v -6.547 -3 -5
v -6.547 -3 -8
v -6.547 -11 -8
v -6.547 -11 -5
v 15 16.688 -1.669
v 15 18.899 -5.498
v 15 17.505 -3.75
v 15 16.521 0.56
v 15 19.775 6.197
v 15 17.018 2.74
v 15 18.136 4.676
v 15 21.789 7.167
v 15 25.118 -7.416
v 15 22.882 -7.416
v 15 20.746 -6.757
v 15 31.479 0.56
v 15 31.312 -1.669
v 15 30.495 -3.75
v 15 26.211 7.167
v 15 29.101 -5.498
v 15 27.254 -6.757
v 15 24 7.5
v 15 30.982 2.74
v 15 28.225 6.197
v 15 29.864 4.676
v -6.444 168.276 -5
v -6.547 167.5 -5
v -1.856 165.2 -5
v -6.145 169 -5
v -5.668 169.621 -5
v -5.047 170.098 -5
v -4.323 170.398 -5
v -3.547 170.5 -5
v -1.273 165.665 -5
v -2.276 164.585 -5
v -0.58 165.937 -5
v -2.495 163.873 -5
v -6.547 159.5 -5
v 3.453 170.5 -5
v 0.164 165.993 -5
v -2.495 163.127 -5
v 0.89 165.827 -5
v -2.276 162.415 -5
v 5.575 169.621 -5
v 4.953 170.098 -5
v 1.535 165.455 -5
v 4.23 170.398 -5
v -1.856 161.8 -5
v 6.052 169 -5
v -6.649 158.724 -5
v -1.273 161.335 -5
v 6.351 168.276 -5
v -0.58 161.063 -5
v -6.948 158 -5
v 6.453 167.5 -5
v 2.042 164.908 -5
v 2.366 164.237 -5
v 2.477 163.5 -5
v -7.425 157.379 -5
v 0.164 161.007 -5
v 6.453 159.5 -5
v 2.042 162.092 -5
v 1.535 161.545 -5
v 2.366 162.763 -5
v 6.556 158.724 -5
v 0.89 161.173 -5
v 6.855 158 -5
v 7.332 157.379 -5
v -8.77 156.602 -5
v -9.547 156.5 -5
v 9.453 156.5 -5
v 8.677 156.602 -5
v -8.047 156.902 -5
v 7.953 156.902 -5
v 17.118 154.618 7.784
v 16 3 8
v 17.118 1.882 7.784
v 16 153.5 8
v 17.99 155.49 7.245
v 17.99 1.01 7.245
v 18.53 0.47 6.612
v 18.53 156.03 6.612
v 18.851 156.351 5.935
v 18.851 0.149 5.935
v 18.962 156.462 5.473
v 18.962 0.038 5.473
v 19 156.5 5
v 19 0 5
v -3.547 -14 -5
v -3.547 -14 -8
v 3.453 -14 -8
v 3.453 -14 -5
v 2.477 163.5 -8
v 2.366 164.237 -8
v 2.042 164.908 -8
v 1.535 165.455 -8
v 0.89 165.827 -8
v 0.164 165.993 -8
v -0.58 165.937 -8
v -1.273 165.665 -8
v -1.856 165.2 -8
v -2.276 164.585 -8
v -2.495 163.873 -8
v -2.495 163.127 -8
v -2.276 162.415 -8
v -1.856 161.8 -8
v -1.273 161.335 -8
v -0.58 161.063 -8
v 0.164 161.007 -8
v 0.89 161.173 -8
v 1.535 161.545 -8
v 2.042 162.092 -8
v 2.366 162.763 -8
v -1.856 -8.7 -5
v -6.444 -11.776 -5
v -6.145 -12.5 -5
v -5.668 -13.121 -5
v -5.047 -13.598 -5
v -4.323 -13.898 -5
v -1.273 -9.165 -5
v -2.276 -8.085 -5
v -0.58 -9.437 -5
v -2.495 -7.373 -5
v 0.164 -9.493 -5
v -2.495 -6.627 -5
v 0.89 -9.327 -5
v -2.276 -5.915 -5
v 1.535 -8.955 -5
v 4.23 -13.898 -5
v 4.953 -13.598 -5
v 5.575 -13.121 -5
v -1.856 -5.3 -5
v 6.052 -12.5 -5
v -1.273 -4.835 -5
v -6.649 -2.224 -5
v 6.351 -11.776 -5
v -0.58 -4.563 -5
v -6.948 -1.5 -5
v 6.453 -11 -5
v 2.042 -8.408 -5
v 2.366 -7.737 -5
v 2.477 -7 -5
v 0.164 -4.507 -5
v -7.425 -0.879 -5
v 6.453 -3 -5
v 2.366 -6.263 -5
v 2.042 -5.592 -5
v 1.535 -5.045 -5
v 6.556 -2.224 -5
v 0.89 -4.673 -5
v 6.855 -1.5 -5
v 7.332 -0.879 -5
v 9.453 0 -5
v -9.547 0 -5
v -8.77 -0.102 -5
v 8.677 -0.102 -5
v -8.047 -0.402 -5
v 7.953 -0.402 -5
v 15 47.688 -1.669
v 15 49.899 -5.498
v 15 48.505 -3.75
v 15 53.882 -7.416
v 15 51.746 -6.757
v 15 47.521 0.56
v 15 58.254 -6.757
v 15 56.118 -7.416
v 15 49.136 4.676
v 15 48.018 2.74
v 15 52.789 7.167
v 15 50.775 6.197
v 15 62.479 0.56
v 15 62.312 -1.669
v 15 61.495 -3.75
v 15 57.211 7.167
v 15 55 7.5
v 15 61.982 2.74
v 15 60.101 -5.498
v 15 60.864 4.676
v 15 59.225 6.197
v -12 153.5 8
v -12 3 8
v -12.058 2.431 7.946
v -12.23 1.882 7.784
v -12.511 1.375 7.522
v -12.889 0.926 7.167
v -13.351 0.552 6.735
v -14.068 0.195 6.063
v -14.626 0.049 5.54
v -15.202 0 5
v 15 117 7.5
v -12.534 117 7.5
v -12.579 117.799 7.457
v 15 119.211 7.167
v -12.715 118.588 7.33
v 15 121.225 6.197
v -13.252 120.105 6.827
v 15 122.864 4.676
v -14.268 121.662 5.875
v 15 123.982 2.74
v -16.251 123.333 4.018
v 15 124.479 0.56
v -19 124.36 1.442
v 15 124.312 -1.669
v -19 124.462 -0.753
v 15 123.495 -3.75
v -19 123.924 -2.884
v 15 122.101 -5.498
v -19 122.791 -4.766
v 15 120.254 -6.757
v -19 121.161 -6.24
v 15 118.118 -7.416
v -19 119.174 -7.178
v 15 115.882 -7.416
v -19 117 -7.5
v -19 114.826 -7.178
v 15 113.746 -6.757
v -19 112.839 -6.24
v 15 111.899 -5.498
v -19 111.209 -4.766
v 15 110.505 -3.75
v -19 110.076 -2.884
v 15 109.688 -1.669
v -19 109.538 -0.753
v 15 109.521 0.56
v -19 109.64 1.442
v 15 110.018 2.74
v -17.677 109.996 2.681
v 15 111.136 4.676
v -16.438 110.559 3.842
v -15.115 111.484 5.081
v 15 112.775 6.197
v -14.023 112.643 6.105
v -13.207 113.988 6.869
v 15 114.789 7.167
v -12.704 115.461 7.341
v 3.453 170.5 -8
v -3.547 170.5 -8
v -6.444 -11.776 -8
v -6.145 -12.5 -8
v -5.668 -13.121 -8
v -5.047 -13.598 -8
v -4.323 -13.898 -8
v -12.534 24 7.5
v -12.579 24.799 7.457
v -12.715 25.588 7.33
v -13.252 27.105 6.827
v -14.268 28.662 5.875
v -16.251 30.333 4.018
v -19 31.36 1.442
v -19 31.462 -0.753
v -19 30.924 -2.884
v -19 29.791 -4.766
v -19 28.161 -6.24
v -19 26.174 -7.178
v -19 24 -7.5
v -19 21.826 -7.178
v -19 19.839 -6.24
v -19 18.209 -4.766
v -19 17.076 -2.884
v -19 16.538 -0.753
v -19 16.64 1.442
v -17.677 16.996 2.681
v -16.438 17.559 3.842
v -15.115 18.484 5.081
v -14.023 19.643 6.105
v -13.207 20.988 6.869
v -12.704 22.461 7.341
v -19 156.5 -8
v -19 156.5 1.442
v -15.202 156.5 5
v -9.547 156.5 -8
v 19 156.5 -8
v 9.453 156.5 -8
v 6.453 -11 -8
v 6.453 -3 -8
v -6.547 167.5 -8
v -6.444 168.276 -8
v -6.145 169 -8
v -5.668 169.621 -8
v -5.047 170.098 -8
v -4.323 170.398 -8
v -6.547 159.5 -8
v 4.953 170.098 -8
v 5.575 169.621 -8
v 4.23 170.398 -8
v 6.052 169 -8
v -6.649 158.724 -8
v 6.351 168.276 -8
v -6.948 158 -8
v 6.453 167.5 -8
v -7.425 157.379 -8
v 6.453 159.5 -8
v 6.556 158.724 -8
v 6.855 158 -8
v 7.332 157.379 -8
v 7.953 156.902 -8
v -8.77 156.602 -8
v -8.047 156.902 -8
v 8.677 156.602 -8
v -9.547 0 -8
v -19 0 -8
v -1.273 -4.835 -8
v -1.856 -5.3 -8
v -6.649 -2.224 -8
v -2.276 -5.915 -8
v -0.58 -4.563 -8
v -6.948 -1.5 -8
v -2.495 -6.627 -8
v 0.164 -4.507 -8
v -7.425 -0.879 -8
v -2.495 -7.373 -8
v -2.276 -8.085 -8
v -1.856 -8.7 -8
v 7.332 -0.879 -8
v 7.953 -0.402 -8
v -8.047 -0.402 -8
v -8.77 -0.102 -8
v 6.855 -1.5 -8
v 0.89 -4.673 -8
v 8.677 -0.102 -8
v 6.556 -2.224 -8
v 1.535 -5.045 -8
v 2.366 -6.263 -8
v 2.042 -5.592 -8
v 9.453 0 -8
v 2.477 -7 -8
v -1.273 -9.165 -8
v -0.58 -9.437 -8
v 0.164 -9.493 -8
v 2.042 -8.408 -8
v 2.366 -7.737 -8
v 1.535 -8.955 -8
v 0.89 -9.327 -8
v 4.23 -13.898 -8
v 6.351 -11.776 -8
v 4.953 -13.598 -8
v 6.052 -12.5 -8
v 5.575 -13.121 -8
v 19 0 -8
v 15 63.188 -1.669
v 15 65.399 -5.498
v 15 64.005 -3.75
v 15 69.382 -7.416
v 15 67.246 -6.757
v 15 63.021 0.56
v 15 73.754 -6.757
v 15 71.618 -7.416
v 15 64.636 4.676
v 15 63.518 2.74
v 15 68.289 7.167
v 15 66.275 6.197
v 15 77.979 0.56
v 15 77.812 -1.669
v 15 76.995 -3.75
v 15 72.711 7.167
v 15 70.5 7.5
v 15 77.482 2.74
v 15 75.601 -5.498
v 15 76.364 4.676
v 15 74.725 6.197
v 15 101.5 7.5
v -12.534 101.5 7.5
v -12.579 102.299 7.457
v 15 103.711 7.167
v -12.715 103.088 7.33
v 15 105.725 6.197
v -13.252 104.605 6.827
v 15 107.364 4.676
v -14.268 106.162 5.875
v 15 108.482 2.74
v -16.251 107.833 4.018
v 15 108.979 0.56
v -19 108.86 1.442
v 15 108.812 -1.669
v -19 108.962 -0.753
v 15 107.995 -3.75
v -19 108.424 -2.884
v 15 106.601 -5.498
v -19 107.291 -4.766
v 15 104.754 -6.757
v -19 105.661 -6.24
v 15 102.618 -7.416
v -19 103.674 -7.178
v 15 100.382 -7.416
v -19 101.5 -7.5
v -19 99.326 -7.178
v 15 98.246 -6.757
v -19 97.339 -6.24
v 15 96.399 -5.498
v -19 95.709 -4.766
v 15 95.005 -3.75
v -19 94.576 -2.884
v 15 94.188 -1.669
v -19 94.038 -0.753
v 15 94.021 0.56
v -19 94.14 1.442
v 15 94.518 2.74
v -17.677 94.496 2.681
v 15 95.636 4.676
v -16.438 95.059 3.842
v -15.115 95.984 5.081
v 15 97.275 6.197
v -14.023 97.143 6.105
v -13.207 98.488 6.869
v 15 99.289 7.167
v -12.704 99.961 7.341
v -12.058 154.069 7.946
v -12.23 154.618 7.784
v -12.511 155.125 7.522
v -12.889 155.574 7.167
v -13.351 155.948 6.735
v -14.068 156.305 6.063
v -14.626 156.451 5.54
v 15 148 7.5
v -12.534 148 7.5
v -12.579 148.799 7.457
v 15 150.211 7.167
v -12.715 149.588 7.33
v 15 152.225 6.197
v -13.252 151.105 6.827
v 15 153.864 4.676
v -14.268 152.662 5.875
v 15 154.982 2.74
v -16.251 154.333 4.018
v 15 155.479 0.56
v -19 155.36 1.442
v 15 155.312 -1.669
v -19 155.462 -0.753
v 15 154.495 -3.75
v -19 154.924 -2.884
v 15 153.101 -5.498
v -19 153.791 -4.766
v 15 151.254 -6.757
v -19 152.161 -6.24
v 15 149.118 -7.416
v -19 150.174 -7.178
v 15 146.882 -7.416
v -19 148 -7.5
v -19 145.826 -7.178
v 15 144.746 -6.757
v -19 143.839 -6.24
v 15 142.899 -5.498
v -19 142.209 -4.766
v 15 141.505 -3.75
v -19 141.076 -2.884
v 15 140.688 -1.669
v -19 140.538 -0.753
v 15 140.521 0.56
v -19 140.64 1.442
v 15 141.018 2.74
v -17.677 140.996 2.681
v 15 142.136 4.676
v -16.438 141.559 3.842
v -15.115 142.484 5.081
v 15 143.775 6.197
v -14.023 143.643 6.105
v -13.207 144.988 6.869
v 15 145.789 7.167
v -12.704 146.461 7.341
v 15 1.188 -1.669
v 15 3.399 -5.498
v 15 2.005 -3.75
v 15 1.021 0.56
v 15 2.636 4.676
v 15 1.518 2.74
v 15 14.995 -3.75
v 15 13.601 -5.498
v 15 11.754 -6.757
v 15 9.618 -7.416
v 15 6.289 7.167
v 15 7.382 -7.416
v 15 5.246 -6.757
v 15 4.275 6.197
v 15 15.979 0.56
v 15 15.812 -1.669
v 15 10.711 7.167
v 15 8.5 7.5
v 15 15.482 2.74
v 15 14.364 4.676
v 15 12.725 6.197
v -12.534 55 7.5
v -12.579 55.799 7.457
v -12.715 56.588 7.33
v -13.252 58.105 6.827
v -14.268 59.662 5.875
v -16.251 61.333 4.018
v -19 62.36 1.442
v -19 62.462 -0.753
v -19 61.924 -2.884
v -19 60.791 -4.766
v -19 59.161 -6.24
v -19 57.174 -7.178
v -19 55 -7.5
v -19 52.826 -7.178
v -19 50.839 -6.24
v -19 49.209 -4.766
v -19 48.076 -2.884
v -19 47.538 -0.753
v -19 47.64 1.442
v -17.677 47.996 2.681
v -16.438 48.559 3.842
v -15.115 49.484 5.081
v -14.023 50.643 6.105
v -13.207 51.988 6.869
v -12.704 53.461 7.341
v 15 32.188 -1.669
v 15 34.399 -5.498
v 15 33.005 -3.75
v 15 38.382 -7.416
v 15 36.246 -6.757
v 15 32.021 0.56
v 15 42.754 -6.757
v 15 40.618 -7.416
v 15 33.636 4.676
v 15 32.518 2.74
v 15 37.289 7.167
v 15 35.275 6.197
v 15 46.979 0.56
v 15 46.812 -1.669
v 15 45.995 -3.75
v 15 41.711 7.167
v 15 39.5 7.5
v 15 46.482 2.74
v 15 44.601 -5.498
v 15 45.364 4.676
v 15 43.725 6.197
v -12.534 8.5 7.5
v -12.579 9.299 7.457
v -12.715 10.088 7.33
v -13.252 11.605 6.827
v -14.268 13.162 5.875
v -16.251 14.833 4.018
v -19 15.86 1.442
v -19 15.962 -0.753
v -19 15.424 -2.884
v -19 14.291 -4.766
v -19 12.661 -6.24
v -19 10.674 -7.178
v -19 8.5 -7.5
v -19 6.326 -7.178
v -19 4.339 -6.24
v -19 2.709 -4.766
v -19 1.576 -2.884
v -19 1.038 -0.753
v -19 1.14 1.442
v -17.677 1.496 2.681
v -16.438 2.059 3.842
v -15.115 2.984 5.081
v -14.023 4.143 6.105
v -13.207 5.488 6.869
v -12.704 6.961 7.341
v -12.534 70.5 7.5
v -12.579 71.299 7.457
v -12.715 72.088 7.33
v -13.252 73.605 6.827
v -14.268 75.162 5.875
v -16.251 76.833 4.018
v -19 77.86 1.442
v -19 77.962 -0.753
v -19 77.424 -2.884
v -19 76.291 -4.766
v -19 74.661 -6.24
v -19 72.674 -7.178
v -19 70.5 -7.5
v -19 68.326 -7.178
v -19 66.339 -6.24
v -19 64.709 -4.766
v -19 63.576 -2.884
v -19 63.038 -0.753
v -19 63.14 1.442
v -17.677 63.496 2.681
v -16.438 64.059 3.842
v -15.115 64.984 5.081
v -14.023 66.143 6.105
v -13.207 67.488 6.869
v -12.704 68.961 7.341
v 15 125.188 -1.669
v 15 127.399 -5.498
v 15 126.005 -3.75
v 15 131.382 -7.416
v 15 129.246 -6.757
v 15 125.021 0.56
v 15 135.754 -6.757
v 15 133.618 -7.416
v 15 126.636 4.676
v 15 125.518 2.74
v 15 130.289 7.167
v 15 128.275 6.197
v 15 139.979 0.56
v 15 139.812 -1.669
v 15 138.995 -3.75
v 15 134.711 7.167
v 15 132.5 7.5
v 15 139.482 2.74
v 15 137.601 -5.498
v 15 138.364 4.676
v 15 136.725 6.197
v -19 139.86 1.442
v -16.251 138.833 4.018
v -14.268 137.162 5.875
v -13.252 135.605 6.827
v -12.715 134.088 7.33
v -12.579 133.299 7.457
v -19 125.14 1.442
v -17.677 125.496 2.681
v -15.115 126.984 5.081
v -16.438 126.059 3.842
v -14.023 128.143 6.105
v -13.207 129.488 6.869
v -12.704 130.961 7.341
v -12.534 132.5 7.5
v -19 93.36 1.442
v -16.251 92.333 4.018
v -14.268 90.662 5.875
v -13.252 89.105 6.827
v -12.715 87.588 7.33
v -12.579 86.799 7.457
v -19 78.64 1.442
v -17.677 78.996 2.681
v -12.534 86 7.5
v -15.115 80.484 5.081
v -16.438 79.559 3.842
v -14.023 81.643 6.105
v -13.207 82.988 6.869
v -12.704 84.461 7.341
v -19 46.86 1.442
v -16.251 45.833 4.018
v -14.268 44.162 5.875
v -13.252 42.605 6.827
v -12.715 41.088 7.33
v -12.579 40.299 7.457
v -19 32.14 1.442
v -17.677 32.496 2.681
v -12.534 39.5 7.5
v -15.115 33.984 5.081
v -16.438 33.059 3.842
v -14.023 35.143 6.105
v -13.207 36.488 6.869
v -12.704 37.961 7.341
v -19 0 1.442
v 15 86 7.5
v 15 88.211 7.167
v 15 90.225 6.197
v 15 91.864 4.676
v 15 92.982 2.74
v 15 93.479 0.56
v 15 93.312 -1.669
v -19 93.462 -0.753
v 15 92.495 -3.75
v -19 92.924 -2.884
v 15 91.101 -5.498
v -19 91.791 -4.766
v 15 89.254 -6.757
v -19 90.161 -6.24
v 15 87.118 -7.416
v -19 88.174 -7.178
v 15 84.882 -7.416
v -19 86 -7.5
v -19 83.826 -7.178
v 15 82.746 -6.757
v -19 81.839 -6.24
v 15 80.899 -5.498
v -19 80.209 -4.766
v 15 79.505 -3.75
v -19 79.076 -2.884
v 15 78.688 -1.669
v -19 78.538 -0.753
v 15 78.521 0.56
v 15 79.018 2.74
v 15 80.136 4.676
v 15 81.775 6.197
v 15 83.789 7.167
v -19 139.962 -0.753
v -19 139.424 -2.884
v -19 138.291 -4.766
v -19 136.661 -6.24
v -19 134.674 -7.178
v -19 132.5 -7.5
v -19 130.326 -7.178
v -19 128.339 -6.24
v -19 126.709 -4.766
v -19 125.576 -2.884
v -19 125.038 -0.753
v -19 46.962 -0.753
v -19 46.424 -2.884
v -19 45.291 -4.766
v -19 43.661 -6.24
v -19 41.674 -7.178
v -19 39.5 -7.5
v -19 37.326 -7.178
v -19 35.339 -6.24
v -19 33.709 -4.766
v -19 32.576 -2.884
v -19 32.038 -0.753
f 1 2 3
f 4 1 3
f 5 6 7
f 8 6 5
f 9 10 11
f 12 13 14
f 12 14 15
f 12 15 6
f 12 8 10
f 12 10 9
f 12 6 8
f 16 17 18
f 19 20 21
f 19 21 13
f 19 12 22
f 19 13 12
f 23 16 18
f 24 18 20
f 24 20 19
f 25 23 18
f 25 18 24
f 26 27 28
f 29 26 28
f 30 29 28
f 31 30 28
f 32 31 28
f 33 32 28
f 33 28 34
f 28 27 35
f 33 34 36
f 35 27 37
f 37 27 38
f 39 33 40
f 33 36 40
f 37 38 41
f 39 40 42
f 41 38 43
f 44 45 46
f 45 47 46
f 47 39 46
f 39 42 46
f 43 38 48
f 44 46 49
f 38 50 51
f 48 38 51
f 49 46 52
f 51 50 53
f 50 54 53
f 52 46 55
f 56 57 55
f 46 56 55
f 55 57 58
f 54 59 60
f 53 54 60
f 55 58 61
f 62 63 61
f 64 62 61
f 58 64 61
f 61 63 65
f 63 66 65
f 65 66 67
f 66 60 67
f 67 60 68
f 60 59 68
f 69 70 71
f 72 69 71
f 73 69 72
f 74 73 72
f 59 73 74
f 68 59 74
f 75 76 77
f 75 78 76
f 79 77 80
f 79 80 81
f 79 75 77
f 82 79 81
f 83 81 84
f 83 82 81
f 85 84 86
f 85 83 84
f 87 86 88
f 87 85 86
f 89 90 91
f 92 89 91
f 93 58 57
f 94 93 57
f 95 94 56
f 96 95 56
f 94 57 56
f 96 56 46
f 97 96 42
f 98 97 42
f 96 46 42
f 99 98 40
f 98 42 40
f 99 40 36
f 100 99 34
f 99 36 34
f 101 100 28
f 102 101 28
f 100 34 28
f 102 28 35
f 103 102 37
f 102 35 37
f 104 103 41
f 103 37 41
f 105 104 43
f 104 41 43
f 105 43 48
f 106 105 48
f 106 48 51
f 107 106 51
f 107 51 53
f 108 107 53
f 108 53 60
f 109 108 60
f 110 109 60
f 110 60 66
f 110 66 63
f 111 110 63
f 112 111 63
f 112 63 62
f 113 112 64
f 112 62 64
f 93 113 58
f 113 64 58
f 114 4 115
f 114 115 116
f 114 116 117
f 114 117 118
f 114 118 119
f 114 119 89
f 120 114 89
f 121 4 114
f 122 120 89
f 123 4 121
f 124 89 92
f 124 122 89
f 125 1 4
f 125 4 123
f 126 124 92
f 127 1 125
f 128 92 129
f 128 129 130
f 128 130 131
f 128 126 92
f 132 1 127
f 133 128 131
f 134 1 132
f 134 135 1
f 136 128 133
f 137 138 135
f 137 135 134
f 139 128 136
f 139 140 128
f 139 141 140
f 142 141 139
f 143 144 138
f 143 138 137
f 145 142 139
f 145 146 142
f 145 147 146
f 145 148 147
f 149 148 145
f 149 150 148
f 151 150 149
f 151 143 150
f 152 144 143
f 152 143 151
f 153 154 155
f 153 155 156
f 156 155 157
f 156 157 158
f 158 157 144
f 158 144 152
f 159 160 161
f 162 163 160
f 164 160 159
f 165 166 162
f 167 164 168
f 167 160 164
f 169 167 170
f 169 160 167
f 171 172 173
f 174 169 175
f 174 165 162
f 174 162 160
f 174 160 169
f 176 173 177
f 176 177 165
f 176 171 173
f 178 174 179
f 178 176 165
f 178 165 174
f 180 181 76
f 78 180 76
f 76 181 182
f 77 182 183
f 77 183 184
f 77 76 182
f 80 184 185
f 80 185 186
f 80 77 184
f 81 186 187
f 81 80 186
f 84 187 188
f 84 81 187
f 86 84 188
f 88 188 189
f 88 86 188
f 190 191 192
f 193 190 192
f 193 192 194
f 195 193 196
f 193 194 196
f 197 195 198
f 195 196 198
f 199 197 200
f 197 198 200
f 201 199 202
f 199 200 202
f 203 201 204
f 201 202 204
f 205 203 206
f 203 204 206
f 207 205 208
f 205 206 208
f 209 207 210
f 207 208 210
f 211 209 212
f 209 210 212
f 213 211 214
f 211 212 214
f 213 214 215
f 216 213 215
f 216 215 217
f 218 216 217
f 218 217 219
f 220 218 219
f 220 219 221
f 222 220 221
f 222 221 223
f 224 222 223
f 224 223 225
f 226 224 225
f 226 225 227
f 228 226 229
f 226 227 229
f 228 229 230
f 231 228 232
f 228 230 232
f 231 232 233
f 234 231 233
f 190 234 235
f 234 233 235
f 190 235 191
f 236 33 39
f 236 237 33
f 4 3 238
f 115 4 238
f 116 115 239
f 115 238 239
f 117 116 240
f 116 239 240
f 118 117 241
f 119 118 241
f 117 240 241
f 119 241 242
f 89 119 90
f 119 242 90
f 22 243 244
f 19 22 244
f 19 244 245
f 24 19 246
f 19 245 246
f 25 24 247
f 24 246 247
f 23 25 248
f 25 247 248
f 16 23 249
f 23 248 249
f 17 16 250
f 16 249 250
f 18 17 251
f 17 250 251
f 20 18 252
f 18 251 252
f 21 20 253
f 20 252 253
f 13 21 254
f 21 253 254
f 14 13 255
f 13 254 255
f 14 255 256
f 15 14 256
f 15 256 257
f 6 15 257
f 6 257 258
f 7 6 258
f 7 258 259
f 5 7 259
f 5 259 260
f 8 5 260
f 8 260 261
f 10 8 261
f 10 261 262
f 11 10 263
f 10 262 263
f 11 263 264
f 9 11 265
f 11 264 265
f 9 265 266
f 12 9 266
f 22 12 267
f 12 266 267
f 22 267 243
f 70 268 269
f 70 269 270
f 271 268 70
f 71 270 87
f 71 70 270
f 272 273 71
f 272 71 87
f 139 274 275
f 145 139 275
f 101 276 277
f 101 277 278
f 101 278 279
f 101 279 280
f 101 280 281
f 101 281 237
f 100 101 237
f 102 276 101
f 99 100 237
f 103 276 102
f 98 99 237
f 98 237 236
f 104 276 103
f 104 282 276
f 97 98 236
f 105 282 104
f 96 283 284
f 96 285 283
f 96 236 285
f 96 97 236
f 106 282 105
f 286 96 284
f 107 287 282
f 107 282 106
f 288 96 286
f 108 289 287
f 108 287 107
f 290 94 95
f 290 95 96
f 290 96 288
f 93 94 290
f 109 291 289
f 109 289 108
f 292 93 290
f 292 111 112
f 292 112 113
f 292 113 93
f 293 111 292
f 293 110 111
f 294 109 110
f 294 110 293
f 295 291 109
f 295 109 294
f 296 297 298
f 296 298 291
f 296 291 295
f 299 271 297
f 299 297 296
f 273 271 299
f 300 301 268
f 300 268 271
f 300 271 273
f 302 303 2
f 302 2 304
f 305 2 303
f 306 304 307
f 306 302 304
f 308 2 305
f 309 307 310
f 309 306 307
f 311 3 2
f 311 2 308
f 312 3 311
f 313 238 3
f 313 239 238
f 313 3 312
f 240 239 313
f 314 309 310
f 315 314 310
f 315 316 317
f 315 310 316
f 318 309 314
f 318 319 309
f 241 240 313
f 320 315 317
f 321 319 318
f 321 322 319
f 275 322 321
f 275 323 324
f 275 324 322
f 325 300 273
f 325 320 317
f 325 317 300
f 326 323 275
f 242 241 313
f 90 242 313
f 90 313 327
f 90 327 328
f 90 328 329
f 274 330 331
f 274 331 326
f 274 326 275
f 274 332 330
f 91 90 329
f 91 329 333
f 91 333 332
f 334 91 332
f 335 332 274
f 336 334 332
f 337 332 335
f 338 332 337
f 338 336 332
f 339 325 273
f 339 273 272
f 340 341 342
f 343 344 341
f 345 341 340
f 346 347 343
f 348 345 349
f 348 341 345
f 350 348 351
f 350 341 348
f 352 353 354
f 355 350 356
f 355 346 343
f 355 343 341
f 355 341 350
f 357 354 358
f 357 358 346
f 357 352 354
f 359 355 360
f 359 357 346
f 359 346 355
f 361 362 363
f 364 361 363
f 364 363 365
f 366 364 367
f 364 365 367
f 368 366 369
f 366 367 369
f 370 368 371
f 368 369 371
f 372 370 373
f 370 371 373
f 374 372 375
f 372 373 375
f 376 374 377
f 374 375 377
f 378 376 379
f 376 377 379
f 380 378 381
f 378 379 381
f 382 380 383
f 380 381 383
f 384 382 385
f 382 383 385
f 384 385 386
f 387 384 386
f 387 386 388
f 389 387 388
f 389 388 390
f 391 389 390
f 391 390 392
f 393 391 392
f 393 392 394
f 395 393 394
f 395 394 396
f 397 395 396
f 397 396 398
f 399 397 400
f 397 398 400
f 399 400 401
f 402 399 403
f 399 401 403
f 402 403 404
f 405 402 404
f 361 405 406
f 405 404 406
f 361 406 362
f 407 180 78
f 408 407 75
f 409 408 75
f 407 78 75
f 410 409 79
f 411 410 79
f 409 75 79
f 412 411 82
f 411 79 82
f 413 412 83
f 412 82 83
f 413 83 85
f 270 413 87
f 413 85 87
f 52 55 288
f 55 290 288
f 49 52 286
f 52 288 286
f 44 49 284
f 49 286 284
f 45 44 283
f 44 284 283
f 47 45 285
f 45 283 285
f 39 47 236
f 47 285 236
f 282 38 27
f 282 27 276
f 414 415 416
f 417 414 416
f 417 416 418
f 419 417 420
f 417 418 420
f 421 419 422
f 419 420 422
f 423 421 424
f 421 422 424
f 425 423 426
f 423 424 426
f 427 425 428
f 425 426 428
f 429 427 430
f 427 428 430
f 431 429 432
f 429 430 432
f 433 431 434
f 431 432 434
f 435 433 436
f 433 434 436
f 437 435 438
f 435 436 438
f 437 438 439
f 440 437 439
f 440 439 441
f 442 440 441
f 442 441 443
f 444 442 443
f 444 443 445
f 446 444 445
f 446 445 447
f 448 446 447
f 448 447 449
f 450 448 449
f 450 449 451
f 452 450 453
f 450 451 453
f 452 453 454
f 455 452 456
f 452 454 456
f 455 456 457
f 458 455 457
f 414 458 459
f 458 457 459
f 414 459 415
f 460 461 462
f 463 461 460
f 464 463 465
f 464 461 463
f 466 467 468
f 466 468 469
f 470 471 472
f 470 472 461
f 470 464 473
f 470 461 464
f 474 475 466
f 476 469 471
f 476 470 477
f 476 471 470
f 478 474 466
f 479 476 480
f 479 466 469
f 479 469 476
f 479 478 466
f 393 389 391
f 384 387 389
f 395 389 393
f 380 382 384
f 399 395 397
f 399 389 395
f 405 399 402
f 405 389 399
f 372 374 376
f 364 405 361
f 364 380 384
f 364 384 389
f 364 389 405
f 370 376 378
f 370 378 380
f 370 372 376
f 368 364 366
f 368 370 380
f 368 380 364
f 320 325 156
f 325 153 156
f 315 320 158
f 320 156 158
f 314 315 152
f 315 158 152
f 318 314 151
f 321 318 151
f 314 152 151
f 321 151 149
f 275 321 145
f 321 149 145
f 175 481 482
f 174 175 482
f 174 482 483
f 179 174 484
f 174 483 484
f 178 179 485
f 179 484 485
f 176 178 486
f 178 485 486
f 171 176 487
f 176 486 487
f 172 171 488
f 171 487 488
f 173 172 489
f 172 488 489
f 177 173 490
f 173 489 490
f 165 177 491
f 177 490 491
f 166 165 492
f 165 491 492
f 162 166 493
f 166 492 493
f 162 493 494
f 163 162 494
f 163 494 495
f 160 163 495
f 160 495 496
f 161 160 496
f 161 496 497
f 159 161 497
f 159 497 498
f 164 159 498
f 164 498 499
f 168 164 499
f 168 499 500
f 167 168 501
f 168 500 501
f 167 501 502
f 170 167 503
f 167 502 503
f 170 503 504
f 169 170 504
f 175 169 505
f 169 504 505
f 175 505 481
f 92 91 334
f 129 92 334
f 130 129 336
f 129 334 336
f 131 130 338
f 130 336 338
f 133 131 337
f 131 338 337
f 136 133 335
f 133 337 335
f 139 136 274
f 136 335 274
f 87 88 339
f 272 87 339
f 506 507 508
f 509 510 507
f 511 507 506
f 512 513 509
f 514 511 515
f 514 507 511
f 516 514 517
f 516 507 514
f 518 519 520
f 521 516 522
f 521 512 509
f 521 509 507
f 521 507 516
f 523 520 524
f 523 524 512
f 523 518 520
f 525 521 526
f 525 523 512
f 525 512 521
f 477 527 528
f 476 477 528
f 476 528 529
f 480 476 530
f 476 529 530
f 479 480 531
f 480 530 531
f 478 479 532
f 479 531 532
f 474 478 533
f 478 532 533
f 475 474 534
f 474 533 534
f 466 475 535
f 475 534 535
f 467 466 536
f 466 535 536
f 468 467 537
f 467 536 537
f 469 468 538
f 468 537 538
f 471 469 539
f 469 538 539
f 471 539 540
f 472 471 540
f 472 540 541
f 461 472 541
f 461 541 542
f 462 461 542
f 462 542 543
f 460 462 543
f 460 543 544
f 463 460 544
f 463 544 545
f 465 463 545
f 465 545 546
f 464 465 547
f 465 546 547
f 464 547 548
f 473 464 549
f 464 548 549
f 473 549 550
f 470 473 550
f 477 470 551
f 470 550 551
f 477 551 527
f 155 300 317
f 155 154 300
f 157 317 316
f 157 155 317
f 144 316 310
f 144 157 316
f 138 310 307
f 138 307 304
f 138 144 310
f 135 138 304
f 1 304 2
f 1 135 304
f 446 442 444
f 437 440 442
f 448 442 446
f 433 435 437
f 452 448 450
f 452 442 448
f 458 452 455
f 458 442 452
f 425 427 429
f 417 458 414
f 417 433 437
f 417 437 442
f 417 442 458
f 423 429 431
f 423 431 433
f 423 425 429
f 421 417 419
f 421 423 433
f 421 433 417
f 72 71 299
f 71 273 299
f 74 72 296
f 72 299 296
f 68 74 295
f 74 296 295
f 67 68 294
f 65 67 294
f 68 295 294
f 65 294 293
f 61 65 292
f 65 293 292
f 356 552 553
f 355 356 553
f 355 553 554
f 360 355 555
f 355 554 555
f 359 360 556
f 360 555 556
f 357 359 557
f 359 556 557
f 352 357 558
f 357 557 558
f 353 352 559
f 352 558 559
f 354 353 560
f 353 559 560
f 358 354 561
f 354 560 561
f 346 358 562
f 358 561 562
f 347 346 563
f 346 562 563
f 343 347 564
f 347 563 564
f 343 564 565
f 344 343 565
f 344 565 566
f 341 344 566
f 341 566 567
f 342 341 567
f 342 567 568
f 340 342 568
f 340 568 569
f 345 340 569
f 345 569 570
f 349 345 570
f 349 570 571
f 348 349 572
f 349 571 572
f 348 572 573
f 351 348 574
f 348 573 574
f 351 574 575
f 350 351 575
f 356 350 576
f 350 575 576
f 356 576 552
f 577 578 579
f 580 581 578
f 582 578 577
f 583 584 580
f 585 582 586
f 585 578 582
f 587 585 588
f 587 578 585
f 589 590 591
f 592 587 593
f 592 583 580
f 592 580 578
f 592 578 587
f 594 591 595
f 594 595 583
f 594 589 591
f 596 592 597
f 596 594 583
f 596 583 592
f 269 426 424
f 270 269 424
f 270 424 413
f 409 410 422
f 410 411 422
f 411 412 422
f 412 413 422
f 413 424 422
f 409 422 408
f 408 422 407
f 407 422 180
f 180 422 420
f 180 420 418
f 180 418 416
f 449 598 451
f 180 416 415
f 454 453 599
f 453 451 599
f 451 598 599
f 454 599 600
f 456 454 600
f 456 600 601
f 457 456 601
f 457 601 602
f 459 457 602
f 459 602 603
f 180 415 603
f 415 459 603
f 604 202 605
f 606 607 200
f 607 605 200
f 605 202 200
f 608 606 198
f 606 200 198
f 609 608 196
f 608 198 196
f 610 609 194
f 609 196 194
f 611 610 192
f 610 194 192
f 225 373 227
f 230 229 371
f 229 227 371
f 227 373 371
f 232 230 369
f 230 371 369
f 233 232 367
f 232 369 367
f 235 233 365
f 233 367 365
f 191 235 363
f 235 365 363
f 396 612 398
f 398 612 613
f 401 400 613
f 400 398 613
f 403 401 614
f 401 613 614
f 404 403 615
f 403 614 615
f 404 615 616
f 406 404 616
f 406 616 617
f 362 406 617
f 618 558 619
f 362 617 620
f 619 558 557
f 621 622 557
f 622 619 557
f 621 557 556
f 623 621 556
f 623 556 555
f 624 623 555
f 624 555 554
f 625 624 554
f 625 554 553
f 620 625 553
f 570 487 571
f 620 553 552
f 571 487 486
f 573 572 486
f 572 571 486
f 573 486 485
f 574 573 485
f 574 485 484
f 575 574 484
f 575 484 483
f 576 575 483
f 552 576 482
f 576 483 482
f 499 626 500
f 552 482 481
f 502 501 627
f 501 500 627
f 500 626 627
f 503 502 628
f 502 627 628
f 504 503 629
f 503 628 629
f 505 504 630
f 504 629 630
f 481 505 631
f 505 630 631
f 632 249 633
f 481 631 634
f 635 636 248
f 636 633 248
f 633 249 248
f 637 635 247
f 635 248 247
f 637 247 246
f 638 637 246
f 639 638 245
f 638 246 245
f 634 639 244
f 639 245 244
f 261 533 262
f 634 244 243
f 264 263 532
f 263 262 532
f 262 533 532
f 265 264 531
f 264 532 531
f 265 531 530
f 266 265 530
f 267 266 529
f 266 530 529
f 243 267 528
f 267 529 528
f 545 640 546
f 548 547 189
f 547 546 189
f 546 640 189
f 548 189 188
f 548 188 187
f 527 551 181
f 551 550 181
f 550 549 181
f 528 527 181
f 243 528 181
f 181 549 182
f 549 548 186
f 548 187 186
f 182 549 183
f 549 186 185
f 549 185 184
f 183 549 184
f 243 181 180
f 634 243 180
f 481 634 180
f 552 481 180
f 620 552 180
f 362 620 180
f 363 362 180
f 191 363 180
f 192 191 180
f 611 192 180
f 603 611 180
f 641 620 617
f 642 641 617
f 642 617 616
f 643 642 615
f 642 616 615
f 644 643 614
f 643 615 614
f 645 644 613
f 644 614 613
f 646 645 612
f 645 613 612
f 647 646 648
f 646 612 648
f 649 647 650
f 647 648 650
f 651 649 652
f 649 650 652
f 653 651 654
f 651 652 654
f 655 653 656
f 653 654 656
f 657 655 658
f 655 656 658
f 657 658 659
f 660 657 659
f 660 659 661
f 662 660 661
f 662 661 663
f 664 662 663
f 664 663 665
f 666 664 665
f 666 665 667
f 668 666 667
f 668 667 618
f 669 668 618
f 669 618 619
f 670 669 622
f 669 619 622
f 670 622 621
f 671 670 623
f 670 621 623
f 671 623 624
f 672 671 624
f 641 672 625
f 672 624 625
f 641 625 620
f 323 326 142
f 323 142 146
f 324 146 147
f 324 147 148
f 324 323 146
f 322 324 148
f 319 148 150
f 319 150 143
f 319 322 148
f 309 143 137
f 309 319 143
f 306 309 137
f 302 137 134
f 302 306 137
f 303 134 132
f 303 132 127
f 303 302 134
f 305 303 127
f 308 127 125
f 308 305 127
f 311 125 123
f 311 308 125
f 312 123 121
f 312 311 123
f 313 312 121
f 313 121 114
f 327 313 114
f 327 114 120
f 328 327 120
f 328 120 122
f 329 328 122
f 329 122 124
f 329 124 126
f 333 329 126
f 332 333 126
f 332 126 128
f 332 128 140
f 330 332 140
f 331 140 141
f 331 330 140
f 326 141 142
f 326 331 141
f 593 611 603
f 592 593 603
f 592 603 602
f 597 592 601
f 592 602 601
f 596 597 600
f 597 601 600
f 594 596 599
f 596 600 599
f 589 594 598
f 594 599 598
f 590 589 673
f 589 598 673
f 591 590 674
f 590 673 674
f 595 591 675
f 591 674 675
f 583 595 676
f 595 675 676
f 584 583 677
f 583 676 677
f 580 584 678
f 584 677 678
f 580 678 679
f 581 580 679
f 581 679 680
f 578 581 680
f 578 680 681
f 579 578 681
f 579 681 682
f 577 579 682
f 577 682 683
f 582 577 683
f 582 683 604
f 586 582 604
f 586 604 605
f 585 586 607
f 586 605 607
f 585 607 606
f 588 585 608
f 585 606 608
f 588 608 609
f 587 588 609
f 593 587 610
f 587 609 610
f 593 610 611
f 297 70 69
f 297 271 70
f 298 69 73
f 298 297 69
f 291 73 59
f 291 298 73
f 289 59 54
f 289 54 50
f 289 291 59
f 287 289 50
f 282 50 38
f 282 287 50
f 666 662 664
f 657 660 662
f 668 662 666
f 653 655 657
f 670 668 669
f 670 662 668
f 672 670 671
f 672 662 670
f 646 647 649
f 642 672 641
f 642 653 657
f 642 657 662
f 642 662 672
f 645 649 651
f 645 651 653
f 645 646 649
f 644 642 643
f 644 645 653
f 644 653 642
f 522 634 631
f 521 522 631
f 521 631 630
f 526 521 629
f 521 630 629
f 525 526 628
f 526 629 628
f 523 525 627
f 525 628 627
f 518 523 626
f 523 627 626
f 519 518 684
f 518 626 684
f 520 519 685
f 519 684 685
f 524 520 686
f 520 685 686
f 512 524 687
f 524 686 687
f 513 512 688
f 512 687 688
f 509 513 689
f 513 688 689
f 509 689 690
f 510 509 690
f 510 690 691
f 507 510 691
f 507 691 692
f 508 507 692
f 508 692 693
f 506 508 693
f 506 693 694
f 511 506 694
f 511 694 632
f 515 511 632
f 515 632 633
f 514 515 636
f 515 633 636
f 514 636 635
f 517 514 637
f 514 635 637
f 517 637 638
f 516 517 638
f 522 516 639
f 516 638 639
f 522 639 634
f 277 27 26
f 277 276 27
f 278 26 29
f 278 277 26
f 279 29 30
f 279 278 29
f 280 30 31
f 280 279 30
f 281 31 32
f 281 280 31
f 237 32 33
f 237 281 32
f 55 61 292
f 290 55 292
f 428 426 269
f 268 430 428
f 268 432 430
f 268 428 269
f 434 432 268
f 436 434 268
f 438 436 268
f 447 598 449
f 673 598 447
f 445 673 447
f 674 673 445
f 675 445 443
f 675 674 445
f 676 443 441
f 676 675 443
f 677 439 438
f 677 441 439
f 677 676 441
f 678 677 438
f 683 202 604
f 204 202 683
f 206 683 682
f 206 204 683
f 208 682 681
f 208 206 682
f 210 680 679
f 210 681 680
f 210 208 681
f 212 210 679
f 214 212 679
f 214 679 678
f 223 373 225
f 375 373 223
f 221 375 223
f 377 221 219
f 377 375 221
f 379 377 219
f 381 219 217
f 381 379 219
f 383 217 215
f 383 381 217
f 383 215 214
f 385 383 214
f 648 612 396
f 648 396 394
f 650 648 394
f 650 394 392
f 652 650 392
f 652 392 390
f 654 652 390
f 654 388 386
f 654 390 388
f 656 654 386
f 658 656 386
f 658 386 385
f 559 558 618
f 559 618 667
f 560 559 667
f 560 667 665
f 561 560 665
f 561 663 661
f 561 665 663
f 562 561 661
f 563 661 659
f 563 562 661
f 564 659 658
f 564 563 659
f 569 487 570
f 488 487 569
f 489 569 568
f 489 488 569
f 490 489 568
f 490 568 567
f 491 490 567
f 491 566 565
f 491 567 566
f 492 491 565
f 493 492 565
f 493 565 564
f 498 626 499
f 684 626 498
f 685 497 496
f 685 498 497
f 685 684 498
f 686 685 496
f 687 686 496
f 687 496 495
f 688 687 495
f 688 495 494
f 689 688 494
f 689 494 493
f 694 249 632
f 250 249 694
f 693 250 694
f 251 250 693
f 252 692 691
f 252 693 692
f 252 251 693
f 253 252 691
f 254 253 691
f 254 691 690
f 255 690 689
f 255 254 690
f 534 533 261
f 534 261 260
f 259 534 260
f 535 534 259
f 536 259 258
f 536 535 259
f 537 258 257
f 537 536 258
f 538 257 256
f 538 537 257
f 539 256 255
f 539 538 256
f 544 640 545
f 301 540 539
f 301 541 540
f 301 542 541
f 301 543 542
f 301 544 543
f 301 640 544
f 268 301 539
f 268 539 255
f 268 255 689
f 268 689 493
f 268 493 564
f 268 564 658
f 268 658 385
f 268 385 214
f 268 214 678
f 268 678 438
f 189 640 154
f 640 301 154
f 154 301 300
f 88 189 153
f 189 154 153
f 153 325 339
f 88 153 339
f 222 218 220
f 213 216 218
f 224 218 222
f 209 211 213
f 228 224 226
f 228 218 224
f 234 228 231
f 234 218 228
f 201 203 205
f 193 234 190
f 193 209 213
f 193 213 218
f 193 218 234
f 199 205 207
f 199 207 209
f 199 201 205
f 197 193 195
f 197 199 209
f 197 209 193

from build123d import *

# Parameters (mm, degrees)
SKETCH_1_W          = 38
SKETCH_1_H          = 16
EXTRUDE_1_DEPTH     = 156.5
SKETCH_2_R          = 7.5
CUT_EXTRUDE_1_DEPTH = 34
SKETCH_3_W          = 13
SKETCH_3_H          = 3
EXTRUDE_2_DEPTH     = 14
SKETCH_5_R          = 2.5
CUT_EXTRUDE_2_DEPTH = 3
FILLET_1_R          = 3
CUT_EXTRUDE_3_DEPTH = 156.5
MIRROR_START        = -8
MIRROR_10_OUTLINE_R = 2.5
MIRROR_10_DEPTH     = 3
FILLET_9_R          = 3
FILLET_10_R         = 3


# Read off the part's stored shape, not the designer's step: Зеркальное отражение10
with BuildPart() as part:
    # Эскиз1 → Бобышка-Вытянуть1 (new body)
    with BuildSketch(Plane(origin=(0, 0, 0), x_dir=(1, 0, 0), z_dir=(0, 1, 0))):
        Rectangle(SKETCH_1_W, SKETCH_1_H)
    extrude(amount=EXTRUDE_1_DEPTH)

    # Эскиз2 → Вырез-Вытянуть1 (cut)
    with BuildSketch(Plane.ZY.offset(19)):
        with Locations((0, 8.5)):
            Circle(SKETCH_2_R)
        with Locations((0, 24)):
            Circle(SKETCH_2_R)
        with Locations((0, 39.5)):
            Circle(SKETCH_2_R)
        with Locations((0, 55)):
            Circle(SKETCH_2_R)
        with Locations((0, 70.5)):
            Circle(SKETCH_2_R)
        with Locations((0, 86)):
            Circle(SKETCH_2_R)
        with Locations((0, 101.5)):
            Circle(SKETCH_2_R)
        with Locations((0, 117)):
            Circle(SKETCH_2_R)
        with Locations((0, 132.5)):
            Circle(SKETCH_2_R)
        with Locations((0, 148)):
            Circle(SKETCH_2_R)
    extrude(amount=-CUT_EXTRUDE_1_DEPTH, mode=Mode.SUBTRACT)

    # Эскиз3 → Бобышка-Вытянуть2 (add)
    with BuildSketch(Plane(origin=(0, 156.5, 0), x_dir=(1, 0, 0), z_dir=(0, 1, 0))):
        with Locations((-0.046570885, 6.5)):
            Rectangle(SKETCH_3_W, SKETCH_3_H)
    extrude(amount=EXTRUDE_2_DEPTH)

    # Эскиз5 → Вырез-Вытянуть2 (cut)
    with BuildSketch(Plane.XY.offset(-5)):
        with Locations((-0.023285442, 163.5)):
            Circle(SKETCH_5_R)
    extrude(amount=-CUT_EXTRUDE_2_DEPTH, mode=Mode.SUBTRACT)

    # Скругление1
    fillet_1_edges = [part.edges().sort_by_distance(p)[0] for p in [
        (-6.546570885, 156.5, -6.5),
        (6.453429115, 156.5, -6.5),
        (-6.546570885, 170.5, -6.5),
        (6.453429115, 170.5, -6.5),
    ]]
    fillet(fillet_1_edges, radius=FILLET_1_R)

    # Эскиз6 → Вырез-Вытянуть3 (cut)
    with BuildSketch(Plane.XZ):
        Polygon((-19, 1.441804302), (-12, 8), (-19, 8), align=None)
    extrude(amount=-CUT_EXTRUDE_3_DEPTH, mode=Mode.SUBTRACT)

    # Зеркальное отражение10 outline → Зеркальное отражение10 (add)
    with BuildSketch(Plane.XY.offset(MIRROR_START)):
        with BuildLine():
            Line((6.453429115, 0), (-6.546570885, 0))
            Line((-6.546570885, 0), (-6.546570885, -11))
            ThreePointArc((-6.546570885, -11), (-5.667891229, -13.121320343), (-3.546570885, -14))
            Line((-3.546570885, -14), (3.453429115, -14))
            ThreePointArc((3.453429115, -14), (5.574749459, -13.121320344), (6.453429115, -11))
            Line((6.453429115, -11), (6.453429115, 0))
        make_face()
        with Locations((-0.023285442, -7)):
            Circle(MIRROR_10_OUTLINE_R, mode=Mode.SUBTRACT)
    extrude(amount=MIRROR_10_DEPTH)

    # Скругление9
    fillet_9_edges = [part.edges().sort_by_distance(p)[0] for p in [
        (-6.546570885, 0, -6.5),
        (6.453429115, 0, -6.5),
    ]]
    fillet(fillet_9_edges, radius=FILLET_9_R)

    # Скругление10
    fillet_10_edges = [part.edges().sort_by_distance(p)[0] for p in [
        (3.5, 0, 8),
        (3.5, 156.5, 8),
        (19, 78.25, 8),
    ]]
    fillet(fillet_10_edges, radius=FILLET_10_R)


solid = part.part
